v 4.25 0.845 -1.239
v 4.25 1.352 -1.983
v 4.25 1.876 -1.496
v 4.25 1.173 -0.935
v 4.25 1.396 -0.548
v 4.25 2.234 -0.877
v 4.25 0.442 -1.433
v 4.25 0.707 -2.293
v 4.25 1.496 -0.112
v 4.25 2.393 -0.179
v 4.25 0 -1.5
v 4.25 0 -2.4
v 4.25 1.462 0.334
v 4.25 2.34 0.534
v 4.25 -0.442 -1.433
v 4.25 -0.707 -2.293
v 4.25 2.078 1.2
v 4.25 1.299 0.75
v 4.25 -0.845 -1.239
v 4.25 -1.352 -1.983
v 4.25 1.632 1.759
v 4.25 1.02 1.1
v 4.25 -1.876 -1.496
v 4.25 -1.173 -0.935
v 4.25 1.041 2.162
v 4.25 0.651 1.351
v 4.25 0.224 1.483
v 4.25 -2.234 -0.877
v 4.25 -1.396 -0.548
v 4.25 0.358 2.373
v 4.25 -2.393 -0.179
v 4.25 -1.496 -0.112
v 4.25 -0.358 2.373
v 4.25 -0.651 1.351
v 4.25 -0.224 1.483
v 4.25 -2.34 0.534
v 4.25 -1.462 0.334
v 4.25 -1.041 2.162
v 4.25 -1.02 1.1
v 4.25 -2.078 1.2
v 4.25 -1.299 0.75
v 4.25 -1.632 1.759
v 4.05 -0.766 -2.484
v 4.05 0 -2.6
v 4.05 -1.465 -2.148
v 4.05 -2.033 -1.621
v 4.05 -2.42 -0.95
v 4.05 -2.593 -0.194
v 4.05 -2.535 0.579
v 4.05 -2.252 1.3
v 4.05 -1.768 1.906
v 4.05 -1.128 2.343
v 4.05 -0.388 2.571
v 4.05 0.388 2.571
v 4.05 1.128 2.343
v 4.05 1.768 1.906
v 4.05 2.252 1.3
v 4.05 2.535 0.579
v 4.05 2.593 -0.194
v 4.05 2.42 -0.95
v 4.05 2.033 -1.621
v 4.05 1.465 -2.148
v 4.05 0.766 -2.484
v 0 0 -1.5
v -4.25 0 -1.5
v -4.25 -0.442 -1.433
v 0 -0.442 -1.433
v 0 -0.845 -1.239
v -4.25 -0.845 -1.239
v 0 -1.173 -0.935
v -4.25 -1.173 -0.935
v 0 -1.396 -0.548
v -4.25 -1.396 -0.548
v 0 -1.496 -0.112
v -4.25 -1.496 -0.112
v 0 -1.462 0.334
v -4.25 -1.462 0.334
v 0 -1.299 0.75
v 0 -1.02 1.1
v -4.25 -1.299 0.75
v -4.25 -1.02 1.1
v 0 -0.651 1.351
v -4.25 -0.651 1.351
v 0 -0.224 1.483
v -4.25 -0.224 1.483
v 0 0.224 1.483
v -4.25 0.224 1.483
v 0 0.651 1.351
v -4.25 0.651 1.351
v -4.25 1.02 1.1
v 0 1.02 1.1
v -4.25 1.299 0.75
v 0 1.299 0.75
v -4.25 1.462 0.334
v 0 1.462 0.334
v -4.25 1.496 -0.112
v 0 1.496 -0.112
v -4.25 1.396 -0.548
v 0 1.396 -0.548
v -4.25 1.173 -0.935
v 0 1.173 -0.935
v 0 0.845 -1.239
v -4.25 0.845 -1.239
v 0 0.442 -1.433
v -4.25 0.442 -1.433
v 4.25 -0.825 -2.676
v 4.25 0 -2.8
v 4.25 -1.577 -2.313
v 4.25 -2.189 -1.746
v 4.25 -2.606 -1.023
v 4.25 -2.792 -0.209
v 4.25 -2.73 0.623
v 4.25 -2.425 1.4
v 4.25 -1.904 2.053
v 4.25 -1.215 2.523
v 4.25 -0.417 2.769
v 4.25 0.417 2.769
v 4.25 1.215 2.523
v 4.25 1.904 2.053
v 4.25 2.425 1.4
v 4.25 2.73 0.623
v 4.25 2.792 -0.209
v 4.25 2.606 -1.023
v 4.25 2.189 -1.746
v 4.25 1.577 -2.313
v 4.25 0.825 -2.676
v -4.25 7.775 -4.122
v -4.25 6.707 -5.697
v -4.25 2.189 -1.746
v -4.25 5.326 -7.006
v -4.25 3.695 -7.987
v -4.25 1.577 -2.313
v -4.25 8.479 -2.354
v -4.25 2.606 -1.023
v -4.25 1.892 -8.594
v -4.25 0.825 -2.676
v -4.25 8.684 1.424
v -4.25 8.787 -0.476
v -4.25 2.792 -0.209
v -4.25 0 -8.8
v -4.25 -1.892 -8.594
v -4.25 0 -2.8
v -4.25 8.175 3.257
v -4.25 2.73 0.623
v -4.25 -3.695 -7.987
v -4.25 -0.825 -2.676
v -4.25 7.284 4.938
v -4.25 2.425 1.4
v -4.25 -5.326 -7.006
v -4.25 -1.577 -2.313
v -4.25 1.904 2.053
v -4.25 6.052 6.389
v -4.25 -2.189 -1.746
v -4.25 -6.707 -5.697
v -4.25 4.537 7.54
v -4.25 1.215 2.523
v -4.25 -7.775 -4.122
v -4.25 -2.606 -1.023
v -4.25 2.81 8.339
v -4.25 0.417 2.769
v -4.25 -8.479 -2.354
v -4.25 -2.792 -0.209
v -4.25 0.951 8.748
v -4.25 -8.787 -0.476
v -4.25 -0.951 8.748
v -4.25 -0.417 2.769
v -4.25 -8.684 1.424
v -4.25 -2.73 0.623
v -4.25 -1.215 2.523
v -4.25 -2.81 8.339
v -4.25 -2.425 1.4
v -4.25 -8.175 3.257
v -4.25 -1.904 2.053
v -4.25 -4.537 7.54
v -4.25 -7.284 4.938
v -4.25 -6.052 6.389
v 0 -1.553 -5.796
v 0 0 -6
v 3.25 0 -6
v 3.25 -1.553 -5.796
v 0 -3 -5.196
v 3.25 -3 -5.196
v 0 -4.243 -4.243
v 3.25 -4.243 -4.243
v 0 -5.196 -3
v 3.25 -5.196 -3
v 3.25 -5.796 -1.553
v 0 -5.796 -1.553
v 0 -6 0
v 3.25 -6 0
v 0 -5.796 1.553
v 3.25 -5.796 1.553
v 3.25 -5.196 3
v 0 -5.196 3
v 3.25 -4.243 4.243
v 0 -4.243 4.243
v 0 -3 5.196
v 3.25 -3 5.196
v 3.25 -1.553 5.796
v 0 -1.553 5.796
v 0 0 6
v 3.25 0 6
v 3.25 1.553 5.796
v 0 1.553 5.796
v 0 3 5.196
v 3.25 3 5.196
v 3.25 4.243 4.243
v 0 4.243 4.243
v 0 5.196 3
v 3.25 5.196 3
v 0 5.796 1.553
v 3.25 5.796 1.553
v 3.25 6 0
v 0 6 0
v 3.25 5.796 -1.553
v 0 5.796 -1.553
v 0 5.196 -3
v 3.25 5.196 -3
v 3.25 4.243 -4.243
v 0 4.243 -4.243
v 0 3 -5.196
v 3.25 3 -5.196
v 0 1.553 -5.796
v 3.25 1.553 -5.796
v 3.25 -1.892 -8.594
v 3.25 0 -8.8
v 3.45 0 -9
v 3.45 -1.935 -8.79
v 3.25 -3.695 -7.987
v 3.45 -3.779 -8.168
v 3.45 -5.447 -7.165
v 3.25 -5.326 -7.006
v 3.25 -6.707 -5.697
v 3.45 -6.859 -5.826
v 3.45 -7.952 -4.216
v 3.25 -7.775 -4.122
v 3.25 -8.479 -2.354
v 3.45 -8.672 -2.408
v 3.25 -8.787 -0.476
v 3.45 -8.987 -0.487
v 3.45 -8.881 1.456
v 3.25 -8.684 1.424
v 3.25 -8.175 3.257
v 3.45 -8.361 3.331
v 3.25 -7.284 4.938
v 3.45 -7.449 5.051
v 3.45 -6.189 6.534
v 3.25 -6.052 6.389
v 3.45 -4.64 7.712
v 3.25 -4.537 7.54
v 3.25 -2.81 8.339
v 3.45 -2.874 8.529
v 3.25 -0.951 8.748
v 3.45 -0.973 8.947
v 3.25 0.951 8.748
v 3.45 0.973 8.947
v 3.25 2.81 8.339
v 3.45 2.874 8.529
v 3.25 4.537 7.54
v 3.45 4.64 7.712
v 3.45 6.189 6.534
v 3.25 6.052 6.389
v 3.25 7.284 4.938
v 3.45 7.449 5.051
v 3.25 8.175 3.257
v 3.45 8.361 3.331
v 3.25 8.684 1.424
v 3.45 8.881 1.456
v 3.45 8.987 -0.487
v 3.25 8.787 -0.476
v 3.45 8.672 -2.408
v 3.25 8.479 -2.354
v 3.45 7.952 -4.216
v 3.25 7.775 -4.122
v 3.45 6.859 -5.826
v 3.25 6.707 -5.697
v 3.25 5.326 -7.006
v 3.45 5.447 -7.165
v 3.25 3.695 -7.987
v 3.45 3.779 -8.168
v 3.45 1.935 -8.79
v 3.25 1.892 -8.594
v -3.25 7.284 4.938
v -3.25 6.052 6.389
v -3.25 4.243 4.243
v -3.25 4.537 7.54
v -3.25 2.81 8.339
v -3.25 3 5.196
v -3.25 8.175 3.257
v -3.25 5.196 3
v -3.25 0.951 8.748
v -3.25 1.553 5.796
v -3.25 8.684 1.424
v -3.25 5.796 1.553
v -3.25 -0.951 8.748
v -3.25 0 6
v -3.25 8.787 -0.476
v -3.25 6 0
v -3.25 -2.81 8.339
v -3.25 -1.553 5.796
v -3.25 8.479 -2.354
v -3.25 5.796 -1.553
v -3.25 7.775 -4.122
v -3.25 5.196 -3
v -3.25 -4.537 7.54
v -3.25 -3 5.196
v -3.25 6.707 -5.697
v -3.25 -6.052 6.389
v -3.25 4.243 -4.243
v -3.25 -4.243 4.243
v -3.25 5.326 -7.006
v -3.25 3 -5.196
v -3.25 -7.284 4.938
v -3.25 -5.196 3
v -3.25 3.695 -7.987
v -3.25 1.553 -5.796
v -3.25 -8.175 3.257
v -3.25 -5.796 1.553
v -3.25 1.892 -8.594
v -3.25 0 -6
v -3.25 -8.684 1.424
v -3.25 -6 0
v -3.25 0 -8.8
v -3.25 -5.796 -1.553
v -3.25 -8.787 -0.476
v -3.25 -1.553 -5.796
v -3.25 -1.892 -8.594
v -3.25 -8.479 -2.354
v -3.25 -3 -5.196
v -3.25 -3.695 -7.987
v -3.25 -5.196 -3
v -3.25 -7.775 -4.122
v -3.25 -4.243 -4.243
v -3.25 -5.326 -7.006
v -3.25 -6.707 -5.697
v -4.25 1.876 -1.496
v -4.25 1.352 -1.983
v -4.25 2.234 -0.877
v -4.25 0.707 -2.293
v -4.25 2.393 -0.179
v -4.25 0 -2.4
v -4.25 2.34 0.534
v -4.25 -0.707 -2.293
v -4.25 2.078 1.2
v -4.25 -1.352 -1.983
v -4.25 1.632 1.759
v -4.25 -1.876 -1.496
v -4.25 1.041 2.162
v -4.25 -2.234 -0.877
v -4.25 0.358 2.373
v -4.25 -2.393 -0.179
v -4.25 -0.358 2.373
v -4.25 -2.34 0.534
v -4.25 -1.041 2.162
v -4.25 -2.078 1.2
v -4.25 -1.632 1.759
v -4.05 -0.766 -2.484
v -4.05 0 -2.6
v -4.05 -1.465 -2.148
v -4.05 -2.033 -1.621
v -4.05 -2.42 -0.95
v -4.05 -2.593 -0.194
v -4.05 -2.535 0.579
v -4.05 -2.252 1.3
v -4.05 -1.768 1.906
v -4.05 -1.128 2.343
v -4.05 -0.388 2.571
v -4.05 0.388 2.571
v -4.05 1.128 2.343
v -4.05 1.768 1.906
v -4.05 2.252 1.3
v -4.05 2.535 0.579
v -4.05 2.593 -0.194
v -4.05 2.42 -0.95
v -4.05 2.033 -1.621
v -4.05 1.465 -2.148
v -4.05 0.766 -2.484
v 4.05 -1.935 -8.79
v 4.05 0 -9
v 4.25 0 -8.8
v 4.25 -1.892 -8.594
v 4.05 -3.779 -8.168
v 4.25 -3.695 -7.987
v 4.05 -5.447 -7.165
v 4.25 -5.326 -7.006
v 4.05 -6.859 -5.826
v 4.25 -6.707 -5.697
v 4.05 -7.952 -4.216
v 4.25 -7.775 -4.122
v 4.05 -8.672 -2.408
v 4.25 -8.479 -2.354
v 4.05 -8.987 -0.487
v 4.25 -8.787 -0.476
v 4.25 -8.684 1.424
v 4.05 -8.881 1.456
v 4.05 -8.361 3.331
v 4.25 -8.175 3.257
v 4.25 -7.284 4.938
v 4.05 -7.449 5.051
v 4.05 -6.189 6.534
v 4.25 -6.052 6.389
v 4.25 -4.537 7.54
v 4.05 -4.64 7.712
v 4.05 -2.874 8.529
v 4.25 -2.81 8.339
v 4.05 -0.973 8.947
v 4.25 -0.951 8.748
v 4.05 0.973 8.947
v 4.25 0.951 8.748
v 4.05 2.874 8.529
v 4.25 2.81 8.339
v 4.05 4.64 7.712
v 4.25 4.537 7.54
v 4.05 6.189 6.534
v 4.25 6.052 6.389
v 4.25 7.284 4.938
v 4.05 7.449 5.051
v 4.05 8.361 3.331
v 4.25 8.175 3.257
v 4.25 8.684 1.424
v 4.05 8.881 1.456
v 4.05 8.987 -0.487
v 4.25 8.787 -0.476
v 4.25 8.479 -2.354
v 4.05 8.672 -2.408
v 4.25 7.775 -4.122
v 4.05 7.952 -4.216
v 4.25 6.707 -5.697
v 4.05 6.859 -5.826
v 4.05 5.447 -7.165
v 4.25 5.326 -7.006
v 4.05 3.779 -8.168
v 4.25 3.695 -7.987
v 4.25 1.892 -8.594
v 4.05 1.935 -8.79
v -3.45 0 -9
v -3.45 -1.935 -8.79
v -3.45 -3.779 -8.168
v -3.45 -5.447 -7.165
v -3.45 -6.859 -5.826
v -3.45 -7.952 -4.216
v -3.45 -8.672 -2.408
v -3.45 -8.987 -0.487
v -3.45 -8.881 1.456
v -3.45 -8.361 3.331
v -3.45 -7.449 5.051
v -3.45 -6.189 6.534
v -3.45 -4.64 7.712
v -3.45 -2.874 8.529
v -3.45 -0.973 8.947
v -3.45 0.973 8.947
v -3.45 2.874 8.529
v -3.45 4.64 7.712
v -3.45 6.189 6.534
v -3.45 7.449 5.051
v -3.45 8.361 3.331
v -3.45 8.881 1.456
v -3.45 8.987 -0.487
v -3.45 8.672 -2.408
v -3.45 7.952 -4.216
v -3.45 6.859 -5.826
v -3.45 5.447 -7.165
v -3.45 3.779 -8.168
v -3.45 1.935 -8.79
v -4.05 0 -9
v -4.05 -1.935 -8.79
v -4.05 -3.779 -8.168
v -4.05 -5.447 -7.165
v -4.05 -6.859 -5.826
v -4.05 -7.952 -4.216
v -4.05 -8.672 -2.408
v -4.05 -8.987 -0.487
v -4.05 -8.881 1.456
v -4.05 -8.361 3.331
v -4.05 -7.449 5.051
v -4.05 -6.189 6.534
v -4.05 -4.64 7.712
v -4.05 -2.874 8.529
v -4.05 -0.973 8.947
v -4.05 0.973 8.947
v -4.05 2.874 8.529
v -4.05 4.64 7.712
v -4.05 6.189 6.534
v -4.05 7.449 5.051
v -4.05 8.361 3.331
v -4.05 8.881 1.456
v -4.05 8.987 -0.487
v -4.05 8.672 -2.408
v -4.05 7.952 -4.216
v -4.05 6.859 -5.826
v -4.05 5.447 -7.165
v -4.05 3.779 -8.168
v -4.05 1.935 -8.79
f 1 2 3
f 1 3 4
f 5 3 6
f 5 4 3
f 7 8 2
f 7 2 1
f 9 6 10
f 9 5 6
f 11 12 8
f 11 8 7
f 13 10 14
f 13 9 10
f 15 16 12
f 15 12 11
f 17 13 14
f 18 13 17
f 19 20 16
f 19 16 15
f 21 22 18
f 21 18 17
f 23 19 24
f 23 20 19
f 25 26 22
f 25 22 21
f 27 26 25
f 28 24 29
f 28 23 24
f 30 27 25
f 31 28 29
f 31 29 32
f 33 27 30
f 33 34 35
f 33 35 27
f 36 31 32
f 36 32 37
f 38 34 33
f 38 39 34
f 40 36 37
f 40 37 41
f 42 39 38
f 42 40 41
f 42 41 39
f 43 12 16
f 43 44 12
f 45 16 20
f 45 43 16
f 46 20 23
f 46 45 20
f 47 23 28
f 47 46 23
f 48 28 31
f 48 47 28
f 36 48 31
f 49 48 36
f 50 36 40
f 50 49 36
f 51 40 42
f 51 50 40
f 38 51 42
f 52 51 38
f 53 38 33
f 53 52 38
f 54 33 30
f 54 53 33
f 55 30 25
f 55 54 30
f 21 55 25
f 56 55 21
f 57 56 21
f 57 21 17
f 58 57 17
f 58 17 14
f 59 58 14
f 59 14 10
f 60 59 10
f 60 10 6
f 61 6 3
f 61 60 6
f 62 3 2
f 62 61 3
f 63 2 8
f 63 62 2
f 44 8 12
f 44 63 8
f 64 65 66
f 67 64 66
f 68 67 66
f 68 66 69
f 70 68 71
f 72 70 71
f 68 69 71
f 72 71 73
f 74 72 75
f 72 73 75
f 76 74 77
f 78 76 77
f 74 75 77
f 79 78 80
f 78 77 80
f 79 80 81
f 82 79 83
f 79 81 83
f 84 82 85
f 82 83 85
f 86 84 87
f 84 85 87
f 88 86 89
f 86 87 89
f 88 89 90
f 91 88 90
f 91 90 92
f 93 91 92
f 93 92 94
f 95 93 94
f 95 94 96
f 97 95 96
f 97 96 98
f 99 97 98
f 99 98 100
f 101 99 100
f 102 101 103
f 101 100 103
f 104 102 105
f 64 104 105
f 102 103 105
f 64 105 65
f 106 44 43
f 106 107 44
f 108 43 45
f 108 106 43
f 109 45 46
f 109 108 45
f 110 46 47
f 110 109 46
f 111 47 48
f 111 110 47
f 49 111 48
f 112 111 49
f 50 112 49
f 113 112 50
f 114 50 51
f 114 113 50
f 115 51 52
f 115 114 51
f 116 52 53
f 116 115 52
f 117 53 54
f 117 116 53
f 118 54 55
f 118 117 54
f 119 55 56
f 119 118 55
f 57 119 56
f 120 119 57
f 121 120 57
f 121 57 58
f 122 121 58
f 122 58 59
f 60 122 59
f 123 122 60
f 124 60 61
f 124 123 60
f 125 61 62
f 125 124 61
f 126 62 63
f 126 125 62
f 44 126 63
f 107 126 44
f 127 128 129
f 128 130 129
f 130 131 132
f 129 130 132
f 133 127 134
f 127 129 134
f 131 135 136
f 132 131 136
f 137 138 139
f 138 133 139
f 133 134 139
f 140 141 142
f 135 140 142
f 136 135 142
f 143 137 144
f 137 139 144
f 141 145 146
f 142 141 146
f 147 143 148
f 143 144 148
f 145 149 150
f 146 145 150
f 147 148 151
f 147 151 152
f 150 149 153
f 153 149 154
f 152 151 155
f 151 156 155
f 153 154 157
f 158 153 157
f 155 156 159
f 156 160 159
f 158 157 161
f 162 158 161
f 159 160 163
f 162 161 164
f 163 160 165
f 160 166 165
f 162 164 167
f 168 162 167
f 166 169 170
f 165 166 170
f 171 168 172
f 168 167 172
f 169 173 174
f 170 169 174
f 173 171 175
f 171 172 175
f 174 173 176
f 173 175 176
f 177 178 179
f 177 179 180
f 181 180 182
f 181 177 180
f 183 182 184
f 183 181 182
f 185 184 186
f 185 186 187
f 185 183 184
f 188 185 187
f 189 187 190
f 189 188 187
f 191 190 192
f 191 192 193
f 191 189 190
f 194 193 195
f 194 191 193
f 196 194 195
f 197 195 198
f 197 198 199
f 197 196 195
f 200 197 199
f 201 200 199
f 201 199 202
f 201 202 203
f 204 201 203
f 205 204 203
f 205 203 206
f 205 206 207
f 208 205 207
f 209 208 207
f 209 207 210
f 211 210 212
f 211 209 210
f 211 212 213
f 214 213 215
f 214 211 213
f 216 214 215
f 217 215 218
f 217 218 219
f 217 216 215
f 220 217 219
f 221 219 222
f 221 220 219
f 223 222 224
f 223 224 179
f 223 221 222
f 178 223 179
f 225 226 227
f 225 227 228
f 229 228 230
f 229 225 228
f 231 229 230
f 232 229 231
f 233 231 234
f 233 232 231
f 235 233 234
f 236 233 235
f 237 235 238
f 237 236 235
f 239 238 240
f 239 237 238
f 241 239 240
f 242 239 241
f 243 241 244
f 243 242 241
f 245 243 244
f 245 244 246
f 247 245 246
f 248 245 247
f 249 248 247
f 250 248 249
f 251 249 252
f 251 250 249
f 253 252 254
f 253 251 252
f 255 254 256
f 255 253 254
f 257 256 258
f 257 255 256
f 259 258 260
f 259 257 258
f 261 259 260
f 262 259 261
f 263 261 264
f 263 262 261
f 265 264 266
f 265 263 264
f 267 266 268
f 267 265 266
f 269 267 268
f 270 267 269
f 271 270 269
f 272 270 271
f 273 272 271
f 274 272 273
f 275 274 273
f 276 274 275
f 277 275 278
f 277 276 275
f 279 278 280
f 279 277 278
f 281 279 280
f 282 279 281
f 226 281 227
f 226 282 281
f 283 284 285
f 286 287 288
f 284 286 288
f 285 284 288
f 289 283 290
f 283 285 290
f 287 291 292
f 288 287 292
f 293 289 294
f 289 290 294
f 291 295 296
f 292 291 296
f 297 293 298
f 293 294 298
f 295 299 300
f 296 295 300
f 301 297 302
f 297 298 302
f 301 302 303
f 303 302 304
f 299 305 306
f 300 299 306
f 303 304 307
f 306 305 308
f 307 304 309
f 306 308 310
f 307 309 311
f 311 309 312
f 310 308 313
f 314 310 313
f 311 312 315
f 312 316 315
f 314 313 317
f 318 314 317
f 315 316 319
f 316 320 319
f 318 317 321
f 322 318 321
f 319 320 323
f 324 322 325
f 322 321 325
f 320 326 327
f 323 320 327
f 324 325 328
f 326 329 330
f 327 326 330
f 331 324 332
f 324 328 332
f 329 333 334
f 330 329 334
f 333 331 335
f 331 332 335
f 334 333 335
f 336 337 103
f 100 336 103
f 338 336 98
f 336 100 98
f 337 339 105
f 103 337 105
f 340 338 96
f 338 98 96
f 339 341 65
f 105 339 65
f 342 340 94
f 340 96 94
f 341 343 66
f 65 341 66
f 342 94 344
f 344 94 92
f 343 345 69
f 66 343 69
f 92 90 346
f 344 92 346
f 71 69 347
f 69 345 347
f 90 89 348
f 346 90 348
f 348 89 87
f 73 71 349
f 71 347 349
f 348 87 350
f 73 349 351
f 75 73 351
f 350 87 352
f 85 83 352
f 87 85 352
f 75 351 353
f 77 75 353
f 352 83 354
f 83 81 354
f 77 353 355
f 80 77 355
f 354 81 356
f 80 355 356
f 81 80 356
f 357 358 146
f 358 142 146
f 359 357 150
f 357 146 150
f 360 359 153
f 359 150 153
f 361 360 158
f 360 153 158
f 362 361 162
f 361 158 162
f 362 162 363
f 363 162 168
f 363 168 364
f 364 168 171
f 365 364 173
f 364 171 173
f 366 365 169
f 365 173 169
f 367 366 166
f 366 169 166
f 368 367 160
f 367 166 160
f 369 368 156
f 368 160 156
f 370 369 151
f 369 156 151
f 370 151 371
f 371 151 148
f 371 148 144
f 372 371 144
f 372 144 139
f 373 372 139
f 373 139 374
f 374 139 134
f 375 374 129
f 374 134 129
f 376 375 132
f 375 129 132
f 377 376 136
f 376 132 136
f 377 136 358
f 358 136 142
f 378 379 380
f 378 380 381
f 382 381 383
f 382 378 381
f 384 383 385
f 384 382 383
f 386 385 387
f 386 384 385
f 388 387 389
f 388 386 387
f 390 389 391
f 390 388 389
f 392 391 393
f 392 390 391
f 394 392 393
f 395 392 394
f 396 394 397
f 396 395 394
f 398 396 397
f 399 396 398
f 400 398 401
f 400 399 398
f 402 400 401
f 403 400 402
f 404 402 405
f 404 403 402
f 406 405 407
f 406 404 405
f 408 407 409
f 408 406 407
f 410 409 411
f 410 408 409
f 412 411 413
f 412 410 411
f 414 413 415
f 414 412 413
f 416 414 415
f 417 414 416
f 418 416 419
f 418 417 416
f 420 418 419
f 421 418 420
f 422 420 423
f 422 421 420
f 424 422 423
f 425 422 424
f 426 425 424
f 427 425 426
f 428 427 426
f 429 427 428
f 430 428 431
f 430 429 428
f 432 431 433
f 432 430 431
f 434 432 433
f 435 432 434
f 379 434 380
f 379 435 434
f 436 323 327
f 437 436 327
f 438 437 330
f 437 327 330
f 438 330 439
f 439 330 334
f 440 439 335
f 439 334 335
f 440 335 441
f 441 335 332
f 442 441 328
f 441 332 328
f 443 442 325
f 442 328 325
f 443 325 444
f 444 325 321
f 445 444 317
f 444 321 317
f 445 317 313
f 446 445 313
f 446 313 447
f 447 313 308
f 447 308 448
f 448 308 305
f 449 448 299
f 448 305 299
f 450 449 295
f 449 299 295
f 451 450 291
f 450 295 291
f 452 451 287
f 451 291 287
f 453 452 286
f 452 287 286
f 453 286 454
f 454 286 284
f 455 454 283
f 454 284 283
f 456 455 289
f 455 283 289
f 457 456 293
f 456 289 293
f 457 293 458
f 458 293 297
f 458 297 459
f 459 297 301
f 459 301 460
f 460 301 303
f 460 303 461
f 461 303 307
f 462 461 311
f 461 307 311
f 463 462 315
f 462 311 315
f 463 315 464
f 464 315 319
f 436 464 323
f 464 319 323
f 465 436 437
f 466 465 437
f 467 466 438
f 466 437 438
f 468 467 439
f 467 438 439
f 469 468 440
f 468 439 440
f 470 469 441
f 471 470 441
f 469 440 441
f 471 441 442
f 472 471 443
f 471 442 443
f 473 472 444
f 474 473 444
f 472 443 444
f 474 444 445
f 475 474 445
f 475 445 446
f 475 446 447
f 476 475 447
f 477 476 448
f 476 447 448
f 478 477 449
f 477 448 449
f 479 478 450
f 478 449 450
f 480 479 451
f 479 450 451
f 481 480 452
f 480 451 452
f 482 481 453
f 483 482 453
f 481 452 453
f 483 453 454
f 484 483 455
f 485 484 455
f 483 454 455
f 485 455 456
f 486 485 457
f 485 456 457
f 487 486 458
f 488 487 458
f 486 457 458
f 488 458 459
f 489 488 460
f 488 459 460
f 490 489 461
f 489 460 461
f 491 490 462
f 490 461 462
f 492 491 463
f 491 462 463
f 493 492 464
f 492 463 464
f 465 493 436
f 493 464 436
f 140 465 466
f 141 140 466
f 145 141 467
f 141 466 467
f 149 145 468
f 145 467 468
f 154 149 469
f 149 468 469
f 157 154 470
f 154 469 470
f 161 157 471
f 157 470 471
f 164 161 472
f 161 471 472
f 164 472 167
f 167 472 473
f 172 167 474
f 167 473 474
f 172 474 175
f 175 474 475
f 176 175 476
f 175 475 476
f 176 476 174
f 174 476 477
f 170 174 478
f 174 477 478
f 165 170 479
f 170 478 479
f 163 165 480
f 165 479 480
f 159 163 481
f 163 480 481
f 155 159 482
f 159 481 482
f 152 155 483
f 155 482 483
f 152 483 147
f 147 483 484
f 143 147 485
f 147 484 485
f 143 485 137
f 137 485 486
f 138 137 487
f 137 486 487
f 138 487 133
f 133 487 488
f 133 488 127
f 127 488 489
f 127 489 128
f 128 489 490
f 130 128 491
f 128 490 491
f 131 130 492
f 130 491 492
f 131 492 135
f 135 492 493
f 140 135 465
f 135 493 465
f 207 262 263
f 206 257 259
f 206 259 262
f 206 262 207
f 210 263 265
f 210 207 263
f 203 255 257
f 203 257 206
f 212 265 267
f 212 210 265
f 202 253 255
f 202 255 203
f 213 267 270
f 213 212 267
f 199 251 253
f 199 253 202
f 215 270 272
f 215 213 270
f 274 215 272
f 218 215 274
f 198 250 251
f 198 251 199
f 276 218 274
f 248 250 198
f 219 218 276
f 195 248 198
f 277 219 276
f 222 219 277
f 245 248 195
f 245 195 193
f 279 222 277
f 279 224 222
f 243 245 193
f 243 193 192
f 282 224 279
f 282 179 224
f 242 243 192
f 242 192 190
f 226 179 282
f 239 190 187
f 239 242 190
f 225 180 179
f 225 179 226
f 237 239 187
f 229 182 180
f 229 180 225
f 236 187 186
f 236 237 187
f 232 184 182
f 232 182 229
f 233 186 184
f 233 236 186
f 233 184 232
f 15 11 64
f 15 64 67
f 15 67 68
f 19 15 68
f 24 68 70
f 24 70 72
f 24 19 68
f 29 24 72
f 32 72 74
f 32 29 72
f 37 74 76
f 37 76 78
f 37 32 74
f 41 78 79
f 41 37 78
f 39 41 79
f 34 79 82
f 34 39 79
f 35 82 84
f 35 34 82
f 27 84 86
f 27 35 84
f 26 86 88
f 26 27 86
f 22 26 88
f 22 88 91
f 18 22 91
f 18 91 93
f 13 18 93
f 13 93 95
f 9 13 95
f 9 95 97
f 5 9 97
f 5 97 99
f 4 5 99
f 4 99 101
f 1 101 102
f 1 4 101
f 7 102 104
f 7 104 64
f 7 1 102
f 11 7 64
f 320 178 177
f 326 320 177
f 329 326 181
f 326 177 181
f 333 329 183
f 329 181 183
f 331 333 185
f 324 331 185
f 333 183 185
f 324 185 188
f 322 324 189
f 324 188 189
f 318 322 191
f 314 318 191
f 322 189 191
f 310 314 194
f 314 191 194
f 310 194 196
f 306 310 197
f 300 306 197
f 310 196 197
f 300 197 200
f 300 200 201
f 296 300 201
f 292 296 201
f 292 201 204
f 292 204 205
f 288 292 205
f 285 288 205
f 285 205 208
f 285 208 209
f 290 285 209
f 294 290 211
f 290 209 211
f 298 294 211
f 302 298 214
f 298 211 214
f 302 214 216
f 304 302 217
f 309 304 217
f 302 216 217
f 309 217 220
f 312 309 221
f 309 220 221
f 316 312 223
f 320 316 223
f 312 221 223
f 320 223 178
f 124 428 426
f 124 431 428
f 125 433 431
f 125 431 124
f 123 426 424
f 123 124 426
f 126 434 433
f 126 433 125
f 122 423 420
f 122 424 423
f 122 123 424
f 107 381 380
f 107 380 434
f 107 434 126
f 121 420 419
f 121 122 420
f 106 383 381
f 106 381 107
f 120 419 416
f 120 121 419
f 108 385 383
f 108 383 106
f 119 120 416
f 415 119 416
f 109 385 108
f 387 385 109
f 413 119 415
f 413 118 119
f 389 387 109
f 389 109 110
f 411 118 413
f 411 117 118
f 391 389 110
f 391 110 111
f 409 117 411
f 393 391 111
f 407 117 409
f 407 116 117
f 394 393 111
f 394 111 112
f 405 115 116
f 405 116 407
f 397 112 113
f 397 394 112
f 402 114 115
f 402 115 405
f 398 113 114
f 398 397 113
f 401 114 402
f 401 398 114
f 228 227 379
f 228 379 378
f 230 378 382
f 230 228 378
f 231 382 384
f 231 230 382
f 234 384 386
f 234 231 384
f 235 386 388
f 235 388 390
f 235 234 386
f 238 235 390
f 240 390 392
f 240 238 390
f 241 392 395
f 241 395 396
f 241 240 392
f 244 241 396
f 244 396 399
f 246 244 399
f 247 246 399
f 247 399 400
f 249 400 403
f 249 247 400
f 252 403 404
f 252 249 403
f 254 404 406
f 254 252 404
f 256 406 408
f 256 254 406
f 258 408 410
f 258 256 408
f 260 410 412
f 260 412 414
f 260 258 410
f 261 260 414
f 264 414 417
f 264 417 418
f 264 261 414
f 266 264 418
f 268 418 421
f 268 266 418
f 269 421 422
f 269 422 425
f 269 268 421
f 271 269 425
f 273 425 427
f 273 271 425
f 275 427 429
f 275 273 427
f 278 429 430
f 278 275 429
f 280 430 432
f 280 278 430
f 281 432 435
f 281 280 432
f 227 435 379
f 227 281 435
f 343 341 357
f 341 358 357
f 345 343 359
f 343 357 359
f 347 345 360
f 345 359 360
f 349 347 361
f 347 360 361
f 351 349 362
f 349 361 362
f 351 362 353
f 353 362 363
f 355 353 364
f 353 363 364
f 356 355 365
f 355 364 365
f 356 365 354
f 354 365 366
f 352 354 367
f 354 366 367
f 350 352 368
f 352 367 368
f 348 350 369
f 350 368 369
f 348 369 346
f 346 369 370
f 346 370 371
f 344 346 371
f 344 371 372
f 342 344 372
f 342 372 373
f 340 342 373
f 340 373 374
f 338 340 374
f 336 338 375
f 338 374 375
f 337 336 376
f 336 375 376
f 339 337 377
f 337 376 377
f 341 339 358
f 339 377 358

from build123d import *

# Parameters (mm, degrees)
CHAMFER1_SIZE = 0.2


with BuildPart() as part:
    # Sketch1 → Revolve1 (revolve)
    with BuildSketch(Plane.XY, mode=Mode.PRIVATE) as revolve1_sk:
        Polygon((-4.25, 1.5), (-4.25, 2.4), (-4.05, 2.6), (-4.25, 2.8), (-4.25, 9), (-3.25, 9), (-3.25, 6), (0, 6), (0, 1.5), align=None)
    revolve(revolve1_sk.sketch.rotate(Axis((0, 0, 0), (-1, 0, 0)), 90), axis=Axis((0, 0, 0), (-1, 0, 0)))

    # Mirror1: part across plane


with BuildPart() as part_1:
    add(part.part)
    add(part.part.mirror(Plane(origin=(0, 6, 0), x_dir=(0, 0, 1), z_dir=(1, 0, 0))))

    # Chamfer1
    chamfer1_edges = [part_1.edges().sort_by_distance(p)[0] for p in [
        (-4.25, 0, 9),
        (4.25, 0, 9),
        (3.25, 0, 9),
        (-3.25, 0, 9),
    ]]
    chamfer(chamfer1_edges, length=CHAMFER1_SIZE)


solid = part_1.part
